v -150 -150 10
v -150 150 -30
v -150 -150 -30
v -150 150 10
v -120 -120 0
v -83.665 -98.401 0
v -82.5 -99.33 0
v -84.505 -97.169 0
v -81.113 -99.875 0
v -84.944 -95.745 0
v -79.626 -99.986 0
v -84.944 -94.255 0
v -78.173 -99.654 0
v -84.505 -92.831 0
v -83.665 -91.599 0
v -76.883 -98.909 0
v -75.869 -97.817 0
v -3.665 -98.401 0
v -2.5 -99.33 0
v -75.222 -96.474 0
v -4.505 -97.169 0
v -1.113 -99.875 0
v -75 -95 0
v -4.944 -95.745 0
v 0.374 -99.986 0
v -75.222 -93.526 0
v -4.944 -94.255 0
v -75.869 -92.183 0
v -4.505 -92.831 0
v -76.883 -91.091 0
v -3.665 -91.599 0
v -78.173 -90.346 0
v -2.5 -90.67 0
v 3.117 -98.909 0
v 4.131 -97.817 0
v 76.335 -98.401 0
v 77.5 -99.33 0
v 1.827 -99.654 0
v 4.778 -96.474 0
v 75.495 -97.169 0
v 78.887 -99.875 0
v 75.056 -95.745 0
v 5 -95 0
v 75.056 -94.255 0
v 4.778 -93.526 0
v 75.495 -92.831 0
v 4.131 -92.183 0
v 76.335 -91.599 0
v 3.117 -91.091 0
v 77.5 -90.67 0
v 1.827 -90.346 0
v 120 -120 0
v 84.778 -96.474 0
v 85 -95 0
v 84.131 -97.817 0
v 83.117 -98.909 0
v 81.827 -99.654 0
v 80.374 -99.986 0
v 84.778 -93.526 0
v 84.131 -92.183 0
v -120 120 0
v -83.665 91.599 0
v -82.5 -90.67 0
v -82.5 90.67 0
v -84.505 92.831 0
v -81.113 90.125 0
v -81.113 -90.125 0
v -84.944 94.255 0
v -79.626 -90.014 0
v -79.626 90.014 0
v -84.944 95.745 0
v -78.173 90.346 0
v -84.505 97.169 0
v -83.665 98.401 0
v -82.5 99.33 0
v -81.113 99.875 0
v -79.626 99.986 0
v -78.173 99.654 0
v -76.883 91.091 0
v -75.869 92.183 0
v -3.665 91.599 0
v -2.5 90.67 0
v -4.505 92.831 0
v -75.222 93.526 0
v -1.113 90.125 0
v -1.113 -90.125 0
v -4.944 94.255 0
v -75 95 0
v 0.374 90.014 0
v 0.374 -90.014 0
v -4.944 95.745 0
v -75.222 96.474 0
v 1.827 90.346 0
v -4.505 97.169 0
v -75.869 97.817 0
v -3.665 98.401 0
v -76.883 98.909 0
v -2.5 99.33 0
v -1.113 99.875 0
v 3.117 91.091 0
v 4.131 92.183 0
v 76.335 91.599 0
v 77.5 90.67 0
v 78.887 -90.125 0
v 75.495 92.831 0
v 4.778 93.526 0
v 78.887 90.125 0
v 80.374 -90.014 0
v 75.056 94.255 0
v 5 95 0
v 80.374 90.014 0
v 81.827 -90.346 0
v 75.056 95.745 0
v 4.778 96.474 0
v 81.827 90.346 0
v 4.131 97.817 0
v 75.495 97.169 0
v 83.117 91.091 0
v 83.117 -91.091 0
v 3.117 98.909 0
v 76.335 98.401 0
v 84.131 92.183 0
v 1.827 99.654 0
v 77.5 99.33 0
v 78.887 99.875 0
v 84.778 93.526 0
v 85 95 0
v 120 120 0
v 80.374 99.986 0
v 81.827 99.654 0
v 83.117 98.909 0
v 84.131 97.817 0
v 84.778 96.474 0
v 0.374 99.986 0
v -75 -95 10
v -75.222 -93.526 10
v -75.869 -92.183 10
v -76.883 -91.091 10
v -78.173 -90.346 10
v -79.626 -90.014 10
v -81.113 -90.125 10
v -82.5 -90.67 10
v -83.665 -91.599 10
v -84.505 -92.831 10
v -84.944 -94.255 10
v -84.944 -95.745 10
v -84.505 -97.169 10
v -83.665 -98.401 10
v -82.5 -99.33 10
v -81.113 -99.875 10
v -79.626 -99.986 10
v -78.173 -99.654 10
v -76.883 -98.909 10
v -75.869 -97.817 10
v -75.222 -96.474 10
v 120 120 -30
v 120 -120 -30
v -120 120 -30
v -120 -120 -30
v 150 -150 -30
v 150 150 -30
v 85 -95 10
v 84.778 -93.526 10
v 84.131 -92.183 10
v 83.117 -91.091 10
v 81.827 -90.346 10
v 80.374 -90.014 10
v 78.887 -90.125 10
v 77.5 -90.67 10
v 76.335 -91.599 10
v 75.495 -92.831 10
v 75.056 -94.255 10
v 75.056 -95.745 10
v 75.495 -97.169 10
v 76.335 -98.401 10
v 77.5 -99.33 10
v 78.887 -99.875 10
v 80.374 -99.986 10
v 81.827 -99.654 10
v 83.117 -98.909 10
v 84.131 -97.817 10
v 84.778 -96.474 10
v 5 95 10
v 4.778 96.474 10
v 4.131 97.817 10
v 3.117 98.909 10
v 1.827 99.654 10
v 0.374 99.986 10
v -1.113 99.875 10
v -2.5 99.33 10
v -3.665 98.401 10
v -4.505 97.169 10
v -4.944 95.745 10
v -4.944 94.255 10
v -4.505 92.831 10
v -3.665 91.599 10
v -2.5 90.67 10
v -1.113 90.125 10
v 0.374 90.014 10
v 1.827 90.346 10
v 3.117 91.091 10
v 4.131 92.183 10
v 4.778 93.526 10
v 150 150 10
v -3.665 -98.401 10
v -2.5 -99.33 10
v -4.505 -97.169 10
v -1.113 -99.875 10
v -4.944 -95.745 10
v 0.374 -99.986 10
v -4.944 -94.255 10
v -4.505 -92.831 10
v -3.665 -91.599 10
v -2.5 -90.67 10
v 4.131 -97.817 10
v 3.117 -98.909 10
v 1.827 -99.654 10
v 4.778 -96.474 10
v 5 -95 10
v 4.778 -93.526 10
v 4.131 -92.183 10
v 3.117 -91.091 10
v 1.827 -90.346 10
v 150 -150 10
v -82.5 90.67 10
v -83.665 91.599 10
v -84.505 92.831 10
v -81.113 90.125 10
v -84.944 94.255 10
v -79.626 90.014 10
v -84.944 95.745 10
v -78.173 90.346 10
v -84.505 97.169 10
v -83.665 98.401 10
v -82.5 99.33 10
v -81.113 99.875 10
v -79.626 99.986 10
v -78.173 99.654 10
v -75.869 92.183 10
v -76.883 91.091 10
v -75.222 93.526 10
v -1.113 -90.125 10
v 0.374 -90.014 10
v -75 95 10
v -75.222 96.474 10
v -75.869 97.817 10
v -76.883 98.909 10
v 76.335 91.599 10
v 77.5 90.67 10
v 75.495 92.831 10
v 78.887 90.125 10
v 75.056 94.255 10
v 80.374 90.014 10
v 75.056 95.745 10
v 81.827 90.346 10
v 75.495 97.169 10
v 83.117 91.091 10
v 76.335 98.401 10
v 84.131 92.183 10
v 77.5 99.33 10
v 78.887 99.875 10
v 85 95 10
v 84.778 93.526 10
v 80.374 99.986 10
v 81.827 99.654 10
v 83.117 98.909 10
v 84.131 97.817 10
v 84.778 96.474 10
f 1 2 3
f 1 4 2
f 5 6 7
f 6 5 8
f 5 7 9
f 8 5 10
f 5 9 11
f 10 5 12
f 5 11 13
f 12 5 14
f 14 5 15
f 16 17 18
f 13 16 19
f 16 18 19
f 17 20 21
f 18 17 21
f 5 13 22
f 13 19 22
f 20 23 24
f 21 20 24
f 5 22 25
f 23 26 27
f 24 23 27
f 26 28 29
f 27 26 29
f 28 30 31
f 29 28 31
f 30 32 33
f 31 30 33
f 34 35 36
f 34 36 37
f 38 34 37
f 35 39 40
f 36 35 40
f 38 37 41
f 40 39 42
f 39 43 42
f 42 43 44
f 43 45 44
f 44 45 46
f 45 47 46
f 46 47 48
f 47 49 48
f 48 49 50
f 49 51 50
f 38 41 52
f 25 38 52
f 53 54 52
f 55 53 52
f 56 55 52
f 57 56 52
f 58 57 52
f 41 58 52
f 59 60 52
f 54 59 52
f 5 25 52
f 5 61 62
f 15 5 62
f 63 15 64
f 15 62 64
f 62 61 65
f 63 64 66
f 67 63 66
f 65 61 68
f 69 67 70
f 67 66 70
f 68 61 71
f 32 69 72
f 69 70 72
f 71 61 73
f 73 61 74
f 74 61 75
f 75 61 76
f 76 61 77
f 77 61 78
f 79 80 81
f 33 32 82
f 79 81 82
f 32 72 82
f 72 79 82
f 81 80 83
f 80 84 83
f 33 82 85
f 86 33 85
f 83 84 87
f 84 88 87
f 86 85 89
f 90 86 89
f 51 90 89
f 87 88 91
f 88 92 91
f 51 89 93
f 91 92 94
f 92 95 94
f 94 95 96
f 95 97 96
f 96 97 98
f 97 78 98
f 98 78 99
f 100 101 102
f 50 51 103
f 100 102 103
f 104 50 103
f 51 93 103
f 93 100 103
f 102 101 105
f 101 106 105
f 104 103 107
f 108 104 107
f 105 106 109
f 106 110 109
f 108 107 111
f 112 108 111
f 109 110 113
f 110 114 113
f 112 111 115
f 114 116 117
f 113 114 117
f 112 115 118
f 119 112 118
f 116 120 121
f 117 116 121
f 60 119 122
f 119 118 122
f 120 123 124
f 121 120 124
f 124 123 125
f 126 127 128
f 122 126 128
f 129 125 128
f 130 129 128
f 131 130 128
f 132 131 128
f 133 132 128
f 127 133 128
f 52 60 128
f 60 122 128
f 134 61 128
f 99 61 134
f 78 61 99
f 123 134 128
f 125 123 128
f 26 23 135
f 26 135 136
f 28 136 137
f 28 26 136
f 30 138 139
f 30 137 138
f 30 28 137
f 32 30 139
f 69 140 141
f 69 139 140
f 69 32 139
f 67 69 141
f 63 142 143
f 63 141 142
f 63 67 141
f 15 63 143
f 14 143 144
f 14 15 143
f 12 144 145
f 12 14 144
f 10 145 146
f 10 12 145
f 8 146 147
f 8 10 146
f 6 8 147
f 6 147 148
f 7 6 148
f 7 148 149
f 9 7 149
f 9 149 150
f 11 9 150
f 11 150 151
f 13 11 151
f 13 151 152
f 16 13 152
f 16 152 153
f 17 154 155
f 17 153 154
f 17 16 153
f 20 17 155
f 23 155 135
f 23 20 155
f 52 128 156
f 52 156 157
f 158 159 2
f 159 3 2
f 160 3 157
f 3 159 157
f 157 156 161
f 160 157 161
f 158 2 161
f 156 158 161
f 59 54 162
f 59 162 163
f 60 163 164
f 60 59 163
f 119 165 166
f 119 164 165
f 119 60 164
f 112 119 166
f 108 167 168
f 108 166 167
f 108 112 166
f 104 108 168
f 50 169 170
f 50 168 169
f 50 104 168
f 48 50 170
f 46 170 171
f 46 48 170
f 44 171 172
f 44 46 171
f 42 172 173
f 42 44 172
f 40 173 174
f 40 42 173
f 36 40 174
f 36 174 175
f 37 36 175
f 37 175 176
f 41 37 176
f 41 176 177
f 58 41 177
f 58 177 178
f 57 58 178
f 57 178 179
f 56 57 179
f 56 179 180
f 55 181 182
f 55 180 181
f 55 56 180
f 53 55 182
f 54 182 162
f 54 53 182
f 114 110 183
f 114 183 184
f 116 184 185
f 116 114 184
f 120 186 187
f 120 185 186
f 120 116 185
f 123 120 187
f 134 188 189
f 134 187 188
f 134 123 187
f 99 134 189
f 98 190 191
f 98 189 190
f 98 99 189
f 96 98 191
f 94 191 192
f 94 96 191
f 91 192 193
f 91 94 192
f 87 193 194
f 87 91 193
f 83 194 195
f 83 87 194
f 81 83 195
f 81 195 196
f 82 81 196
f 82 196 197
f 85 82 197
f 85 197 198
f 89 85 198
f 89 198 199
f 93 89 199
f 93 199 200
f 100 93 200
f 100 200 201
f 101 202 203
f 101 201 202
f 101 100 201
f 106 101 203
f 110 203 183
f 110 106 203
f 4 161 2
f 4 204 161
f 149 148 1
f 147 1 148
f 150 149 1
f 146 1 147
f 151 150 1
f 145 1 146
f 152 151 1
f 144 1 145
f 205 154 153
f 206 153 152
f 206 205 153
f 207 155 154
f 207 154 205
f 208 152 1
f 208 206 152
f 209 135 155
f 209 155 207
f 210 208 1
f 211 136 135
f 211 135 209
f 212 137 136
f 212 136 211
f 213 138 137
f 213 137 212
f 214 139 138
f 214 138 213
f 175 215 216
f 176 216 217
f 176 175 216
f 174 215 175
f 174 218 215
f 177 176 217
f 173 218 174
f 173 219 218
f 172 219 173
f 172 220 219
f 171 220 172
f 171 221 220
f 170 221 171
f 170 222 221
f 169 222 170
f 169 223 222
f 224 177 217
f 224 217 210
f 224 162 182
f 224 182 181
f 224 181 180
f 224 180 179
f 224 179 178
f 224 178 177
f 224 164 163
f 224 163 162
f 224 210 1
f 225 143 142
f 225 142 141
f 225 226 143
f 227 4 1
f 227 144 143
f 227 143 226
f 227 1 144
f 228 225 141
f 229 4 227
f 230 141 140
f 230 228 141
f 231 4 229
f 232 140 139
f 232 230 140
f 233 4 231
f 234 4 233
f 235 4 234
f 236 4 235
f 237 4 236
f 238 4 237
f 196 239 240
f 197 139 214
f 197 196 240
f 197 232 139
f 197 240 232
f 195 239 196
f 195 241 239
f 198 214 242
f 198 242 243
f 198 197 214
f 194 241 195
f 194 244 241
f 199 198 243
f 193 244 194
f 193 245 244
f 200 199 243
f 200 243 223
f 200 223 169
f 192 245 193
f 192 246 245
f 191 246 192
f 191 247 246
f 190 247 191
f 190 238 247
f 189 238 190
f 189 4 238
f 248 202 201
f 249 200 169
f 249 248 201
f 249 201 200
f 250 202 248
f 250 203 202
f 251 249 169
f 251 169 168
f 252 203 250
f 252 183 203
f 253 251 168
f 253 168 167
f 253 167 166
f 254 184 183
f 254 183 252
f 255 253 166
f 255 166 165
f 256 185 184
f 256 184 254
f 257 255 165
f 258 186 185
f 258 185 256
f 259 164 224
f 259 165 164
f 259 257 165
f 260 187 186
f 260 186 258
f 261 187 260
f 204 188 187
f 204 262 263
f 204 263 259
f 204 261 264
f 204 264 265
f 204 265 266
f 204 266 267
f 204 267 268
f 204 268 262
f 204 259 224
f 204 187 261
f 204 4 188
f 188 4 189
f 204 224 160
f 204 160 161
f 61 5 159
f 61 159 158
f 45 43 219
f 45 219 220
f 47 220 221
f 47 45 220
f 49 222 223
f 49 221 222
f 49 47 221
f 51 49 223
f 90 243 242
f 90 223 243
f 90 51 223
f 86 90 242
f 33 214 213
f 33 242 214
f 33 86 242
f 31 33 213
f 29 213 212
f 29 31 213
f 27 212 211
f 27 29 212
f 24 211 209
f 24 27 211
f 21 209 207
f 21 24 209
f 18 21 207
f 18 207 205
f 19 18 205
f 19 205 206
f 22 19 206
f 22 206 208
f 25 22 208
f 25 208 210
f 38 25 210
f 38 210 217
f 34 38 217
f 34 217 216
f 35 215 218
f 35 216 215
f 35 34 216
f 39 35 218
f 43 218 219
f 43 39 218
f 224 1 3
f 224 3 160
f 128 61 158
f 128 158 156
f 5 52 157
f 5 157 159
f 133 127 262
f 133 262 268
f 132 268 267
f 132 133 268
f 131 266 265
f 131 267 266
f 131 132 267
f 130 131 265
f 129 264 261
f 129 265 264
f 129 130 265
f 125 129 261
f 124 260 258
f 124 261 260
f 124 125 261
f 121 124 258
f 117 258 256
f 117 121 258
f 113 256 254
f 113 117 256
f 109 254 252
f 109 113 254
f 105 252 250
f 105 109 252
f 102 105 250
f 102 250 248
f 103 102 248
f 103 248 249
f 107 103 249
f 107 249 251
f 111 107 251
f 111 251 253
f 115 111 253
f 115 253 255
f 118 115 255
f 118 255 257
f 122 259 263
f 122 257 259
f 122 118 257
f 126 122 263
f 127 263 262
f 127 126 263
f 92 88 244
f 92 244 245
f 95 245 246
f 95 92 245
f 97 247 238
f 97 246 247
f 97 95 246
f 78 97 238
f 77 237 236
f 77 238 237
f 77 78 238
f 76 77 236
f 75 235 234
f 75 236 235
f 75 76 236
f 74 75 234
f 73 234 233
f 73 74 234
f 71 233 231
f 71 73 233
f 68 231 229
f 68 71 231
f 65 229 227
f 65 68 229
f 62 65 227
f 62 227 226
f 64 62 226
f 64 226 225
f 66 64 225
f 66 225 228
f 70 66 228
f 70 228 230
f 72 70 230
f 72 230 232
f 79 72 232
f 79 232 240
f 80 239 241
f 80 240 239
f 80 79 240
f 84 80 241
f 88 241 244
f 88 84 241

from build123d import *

# Parameters (mm, degrees)
SKETCH1_W               = 300
SKETCH1_H               = 300
BOSS_EXTRUDE1_DEPTH     = 10
BOSS_EXTRUDE4_DEPTH     = 30
CUT_EXTRUDE2_DEPTH      = 215.242852856
CUT_EXTRUDE2_DEPTH_BACK = 215.242852856
SKETCH1_11_R            = 5


with BuildPart() as part:
    # Sketch1 → Boss-Extrude1 (new body)
    with BuildSketch(Plane.XY):
        Rectangle(SKETCH1_W, SKETCH1_H)
    extrude(amount=BOSS_EXTRUDE1_DEPTH)

    # Sketch1<6> → Boss-Extrude4 (add)
    with BuildSketch(Plane.XY):
        Polygon((-120, 150), (-150, 150), (-150, -150), (150, -150), (150, 150), align=None)
        Polygon((120, 0), (120, -120), (0, -120), (-120, -120), (-120, 120), (-55.80388173, 120), (0, 120), (120, 120), align=None, mode=Mode.SUBTRACT)
    extrude(amount=-BOSS_EXTRUDE4_DEPTH)

    # Sketch1<11> → Cut-Extrude2 (cut, two sides: drawn at the far end of the back side and taken through both)
    with BuildSketch(Plane.XY.offset(-CUT_EXTRUDE2_DEPTH_BACK)):
        with Locations((80, 95)):
            Circle(SKETCH1_11_R)
        with Locations((-80, 95)):
            Circle(SKETCH1_11_R)
        with Locations((0, 95)):
            Circle(SKETCH1_11_R)
        with Locations((-80, -95)):
            Circle(SKETCH1_11_R)
        with Locations((80, -95)):
            Circle(SKETCH1_11_R)
        with Locations((0, -95)):
            Circle(SKETCH1_11_R)
    extrude(amount=CUT_EXTRUDE2_DEPTH + CUT_EXTRUDE2_DEPTH_BACK, mode=Mode.SUBTRACT)


solid = part.part
